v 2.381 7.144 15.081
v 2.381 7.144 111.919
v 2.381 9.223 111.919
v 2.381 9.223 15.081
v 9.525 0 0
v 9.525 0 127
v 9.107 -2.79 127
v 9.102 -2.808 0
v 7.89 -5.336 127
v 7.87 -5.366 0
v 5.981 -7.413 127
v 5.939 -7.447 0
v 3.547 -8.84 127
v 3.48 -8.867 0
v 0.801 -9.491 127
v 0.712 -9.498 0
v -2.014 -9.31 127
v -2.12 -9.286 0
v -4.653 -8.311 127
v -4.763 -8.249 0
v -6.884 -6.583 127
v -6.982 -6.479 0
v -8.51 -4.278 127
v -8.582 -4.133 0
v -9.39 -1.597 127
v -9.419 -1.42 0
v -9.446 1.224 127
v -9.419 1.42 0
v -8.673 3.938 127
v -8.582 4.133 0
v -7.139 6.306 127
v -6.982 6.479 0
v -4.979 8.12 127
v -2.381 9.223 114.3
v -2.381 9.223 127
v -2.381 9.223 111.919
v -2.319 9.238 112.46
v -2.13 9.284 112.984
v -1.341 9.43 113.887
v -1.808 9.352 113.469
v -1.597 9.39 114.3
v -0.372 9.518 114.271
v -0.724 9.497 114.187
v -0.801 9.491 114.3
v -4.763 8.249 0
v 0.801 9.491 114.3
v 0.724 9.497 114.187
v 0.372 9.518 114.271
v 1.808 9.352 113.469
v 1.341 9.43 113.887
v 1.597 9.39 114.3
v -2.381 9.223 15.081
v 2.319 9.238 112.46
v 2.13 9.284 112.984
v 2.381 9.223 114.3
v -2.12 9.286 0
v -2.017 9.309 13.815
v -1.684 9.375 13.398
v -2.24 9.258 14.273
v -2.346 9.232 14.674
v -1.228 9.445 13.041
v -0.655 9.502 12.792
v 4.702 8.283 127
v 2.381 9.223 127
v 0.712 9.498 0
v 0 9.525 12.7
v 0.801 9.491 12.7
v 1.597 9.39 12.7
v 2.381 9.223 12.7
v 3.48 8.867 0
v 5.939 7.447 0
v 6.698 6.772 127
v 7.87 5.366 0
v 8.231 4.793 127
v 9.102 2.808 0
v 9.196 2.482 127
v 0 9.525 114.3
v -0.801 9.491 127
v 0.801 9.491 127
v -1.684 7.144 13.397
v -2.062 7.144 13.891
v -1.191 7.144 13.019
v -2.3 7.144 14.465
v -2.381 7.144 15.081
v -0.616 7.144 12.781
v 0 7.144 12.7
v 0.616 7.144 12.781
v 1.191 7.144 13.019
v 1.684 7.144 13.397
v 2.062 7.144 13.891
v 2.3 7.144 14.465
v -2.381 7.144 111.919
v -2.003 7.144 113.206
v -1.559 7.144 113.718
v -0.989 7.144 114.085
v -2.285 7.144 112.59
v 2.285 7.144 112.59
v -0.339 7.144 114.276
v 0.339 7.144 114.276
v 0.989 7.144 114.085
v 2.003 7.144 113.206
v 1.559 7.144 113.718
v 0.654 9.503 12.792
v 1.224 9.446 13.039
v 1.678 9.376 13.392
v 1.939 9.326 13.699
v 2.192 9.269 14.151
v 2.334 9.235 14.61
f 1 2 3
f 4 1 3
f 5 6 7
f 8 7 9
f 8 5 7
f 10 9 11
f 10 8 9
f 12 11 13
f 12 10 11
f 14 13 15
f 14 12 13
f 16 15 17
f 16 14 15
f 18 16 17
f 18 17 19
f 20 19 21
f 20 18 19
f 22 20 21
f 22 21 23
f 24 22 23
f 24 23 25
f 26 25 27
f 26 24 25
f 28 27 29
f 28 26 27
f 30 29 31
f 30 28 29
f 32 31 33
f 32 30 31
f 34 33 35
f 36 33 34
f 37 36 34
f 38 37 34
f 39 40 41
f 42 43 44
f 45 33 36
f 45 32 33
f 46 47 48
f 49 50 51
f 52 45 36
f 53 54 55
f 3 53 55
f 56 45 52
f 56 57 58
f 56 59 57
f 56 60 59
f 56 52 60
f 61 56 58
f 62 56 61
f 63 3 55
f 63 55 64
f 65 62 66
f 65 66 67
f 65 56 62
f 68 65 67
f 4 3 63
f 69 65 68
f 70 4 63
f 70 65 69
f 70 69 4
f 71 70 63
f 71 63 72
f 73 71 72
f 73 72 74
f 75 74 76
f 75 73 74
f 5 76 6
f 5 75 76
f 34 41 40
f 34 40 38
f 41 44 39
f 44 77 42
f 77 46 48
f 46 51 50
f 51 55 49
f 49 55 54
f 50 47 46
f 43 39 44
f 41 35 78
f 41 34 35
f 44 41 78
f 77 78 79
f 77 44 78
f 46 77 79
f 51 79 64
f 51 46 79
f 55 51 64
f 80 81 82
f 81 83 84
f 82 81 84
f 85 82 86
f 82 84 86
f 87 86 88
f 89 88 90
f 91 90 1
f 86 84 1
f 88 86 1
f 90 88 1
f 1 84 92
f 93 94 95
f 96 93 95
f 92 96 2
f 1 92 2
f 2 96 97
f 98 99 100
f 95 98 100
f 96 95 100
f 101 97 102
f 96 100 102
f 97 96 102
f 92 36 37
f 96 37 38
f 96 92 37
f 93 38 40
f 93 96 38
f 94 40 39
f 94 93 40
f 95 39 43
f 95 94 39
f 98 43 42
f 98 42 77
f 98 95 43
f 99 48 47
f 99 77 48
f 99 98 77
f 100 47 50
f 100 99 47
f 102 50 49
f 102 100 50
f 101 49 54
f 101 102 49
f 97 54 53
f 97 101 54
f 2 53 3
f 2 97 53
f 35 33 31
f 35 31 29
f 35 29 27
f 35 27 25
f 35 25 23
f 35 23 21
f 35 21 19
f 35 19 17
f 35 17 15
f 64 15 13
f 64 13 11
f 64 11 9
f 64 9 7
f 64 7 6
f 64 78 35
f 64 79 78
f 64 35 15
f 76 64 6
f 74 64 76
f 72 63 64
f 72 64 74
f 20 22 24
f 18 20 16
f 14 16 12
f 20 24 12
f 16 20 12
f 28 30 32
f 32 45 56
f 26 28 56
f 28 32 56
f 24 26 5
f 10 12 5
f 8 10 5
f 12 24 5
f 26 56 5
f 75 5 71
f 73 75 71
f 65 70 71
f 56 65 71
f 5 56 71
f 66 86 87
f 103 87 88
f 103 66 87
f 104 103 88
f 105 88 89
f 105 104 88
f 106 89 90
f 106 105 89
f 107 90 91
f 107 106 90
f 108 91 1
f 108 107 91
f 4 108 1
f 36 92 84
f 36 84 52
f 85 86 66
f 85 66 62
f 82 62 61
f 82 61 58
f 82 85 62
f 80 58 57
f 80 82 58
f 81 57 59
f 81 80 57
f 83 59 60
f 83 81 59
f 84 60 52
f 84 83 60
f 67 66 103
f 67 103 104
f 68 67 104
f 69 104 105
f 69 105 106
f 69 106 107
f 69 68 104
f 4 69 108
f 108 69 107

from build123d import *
from build123d.topology import SkipClean

# Parameters (mm, degrees)
SKETCH1_R          = 9.525
EXTRUDE1_DEPTH     = 127
SKETCH2_W          = 4.7625
SKETCH2_H          = 4.7625
CUT_EXTRUDE1_DEPTH = 114.3
EXTRUDE2_START     = -12.7
EXTRUDE2_DEPTH     = 12.7
FILLET1_R          = 2.38125


with BuildPart() as part:
    # Sketch1 → Extrude1 (new body)
    with BuildSketch(Plane.XY):
        Circle(SKETCH1_R)
    extrude(amount=EXTRUDE1_DEPTH)

    # Sketch2 → Cut-Extrude1 (cut)
    with BuildSketch(Plane.XY.offset(127)):
        with Locations((0, 9.525)):
            Rectangle(SKETCH2_W, SKETCH2_H)
    extrude(amount=-CUT_EXTRUDE1_DEPTH, mode=Mode.SUBTRACT)

    # Sketch4 → Extrude2 (add)
    with SkipClean():  # the faces are left unmerged after this step: merging them gives an invalid solid
        with BuildSketch(Plane.XY.offset(127).offset(EXTRUDE2_START)):
            with BuildLine():
                Line((2.38125, 7.14375), (-2.38125, 7.14375))
                Line((-2.38125, 7.14375), (-2.38125, 9.222541593))
                ThreePointArc((-2.38125, 9.222541593), (0, 9.525), (2.38125, 9.222541593))
                Line((2.38125, 9.222541593), (2.38125, 7.14375))
            make_face()
        extrude(amount=EXTRUDE2_DEPTH)

    # Fillet1
    # the kernel refuses this fillet: 2.38125 mm, written as the material it adds along each edge
    with BuildSketch(Plane(origin=(2.38125, 15.175666593, 114.3), x_dir=(0, 0, -1), z_dir=(0, -1, 0))) as fillet1_piece_1_section:
        with BuildLine():
            CenterArc((FILLET1_R, -FILLET1_R), FILLET1_R, 90, 90)
            Line((0, -FILLET1_R), (0, 0))
            Line((0, 0), (FILLET1_R, 0))
        make_face()
    fillet1_piece_1 = extrude(amount=13.985041593, mode=Mode.PRIVATE)
    fillet1_piece_1 = fillet1_piece_1 & Plane(origin=(0, 0, 113.773698621), x_dir=(1, 0, 0), z_dir=(0, 0, -1)) * Cylinder(9.525, 38, mode=Mode.PRIVATE)
    add(fillet1_piece_1)
    with BuildSketch(Plane(origin=(-2.38125, 1.190625, 114.3), x_dir=(0, 0, -1), z_dir=(0, 1, 0))) as fillet1_piece_2_section:
        with BuildLine():
            CenterArc((FILLET1_R, -FILLET1_R), FILLET1_R, 90, 90)
            Line((0, -FILLET1_R), (0, 0))
            Line((0, 0), (FILLET1_R, 0))
        make_face()
    fillet1_piece_2 = extrude(amount=13.985041593, mode=Mode.PRIVATE)
    fillet1_piece_2 = fillet1_piece_2 & Plane(origin=(0, 0, 113.760896634), x_dir=(1, 0, 0), z_dir=(0, 0, -1)) * Cylinder(9.525, 38, mode=Mode.PRIVATE)
    add(fillet1_piece_2)
    with BuildSketch(Plane(origin=(-2.38125, 1.190625, 12.7), x_dir=(0, 0, 1), z_dir=(0, 1, 0))) as fillet1_piece_3_section:
        with BuildLine():
            CenterArc((FILLET1_R, FILLET1_R), FILLET1_R, 180, 90)
            Line((0, FILLET1_R), (0, 0))
            Line((0, 0), (FILLET1_R, 0))
        make_face()
    fillet1_piece_3 = extrude(amount=13.985041593, mode=Mode.PRIVATE)
    fillet1_piece_3 = fillet1_piece_3 & Plane(origin=(0, 0, 13.239103366), x_dir=(1, 0, 0), z_dir=(0, 0, -1)) * Cylinder(9.525, 38, mode=Mode.PRIVATE)
    add(fillet1_piece_3)
    with BuildSketch(Plane(origin=(2.38125, 15.175666593, 12.7), x_dir=(-1, 0, 0), z_dir=(0, -1, 0))) as fillet1_piece_4_section:
        with BuildLine():
            CenterArc((FILLET1_R, -FILLET1_R), FILLET1_R, 90, 90)
            Line((0, -FILLET1_R), (0, 0))
            Line((0, 0), (FILLET1_R, 0))
        make_face()
    fillet1_piece_4 = extrude(amount=13.985041593, mode=Mode.PRIVATE)
    fillet1_piece_4 = fillet1_piece_4 & Plane(origin=(0, 0, 13.226300129), x_dir=(1, 0, 0), z_dir=(0, 0, -1)) * Cylinder(9.525, 38, mode=Mode.PRIVATE)
    add(fillet1_piece_4)


solid = part.part
